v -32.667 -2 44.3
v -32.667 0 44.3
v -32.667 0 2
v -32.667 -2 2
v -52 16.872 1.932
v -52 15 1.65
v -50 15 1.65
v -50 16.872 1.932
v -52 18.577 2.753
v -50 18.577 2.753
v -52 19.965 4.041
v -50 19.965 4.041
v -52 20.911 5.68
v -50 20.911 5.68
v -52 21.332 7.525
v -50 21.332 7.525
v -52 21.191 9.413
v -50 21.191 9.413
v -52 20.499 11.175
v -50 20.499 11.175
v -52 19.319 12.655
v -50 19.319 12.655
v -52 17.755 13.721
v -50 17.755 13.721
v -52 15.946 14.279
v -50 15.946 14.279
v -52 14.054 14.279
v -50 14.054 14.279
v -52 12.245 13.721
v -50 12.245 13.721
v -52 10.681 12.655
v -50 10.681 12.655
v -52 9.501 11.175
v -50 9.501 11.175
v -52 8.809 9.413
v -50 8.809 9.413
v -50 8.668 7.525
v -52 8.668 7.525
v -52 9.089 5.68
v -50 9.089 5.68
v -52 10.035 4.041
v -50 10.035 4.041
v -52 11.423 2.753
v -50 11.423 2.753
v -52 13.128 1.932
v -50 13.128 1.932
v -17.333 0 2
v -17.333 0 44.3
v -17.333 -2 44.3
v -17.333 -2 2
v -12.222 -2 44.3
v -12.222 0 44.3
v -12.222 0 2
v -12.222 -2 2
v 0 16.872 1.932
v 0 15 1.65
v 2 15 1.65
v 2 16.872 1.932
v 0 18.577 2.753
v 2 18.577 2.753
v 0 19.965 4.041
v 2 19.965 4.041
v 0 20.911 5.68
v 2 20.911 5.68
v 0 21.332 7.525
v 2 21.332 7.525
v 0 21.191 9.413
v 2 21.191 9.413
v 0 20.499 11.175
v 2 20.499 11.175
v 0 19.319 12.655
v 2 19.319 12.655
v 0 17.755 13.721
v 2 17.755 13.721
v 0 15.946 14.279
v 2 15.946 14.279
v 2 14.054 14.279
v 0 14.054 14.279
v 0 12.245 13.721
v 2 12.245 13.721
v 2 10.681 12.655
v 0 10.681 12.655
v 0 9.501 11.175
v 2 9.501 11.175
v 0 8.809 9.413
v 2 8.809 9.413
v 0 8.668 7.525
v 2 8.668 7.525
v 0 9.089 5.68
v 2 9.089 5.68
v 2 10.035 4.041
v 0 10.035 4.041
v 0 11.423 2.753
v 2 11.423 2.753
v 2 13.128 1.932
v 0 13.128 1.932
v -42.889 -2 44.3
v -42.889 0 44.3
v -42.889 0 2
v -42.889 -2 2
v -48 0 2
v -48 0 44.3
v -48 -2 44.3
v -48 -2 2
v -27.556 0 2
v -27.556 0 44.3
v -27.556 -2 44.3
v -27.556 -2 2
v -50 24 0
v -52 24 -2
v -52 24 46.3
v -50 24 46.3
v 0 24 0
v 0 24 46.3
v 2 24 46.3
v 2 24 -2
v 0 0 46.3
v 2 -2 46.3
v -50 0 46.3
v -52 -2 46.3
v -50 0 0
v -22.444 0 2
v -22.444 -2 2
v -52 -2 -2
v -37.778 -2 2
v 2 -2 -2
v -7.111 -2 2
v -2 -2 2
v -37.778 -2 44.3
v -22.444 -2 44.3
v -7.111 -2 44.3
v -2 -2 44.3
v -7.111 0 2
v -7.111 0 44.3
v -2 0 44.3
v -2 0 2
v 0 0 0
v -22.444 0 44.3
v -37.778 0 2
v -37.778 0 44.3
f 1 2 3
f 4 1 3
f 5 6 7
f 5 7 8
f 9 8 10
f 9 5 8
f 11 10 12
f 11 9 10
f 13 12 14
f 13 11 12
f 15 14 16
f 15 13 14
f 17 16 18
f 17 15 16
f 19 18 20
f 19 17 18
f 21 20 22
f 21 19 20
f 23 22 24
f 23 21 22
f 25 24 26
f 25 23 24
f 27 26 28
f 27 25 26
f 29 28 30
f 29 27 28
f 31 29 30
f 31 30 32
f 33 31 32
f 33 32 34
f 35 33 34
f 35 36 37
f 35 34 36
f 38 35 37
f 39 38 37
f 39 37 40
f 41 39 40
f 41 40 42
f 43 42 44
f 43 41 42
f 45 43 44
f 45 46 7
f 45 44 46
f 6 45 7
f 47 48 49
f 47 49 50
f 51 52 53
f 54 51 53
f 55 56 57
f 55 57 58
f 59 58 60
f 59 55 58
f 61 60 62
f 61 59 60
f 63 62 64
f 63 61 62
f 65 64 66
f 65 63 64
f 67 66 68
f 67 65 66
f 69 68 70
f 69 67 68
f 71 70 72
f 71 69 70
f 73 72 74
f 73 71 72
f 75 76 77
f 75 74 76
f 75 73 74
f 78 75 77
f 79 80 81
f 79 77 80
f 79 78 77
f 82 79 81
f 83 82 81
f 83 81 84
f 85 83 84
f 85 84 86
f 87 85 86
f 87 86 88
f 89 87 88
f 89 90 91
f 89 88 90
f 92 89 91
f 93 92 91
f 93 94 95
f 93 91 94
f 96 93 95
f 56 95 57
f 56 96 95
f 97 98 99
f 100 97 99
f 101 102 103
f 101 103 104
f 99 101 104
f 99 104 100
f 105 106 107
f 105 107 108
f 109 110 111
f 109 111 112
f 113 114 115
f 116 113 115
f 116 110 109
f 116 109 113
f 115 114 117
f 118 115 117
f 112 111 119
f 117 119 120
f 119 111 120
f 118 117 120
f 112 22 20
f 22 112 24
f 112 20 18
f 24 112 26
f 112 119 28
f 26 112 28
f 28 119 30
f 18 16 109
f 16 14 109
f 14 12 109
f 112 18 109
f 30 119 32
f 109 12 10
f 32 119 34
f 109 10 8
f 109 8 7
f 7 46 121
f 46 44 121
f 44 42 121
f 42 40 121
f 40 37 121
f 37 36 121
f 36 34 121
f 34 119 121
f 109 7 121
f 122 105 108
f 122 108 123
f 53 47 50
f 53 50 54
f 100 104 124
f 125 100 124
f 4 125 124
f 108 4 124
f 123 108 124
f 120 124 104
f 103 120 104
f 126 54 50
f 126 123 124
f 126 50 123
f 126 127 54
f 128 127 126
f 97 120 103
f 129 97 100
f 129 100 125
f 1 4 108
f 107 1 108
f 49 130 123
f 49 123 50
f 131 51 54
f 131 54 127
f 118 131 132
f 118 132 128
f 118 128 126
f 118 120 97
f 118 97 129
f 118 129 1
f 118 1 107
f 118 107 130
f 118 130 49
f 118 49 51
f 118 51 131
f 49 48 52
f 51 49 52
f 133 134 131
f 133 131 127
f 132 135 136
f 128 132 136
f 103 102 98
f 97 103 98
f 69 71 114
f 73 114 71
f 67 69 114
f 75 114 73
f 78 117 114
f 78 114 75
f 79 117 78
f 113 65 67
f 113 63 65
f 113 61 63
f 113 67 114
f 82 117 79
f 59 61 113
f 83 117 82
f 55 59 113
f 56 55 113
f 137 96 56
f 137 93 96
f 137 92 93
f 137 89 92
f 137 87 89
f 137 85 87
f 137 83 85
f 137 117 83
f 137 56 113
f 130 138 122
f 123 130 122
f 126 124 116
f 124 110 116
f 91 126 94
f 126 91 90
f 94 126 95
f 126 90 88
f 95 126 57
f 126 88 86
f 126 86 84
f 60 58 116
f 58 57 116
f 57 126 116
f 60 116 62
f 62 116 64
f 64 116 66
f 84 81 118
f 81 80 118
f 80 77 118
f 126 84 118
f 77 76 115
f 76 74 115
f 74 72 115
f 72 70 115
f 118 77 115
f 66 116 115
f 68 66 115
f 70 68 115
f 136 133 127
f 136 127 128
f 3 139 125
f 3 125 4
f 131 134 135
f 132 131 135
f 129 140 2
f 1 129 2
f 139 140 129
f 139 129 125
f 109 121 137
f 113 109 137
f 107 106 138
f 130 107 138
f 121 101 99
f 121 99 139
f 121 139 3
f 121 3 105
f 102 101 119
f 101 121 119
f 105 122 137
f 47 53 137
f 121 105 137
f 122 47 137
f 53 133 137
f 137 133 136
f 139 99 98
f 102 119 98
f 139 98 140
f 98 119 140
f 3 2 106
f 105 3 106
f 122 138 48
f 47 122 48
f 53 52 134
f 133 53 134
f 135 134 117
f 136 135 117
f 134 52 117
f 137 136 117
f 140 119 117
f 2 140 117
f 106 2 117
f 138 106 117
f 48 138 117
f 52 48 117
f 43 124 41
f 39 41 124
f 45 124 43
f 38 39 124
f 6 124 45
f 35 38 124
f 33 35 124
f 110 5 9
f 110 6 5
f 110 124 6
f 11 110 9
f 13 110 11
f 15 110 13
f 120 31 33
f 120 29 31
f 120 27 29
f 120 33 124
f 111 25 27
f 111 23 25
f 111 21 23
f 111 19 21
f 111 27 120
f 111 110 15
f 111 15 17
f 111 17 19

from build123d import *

# Parameters (mm, degrees)
CROQUIS1_W                 = 54
CROQUIS1_H                 = 50.3
CROQUIS1_W_2               = 50
CROQUIS1_H_2               = 46.3
SALIENTE_EXTRUIR1_DEPTH    = 24
CROQUIS2_W                 = 54
CROQUIS2_H                 = 50.3
SALIENTE_EXTRUIR2_DEPTH    = 2
CORTAR_EXTRUIR4_DEPTH      = 54
CORTAR_EXTRUIR5_REACH      = 75.646
CROQUIS7_W                 = 5.111111111
CROQUIS7_H                 = 42.3
CROQUIS7_W_2               = 5.111111112
CORTAR_EXTRUIR6_DEPTH      = 59.725548103
CORTAR_EXTRUIR6_DEPTH_BACK = 59.725548103
CROQUIS8_R                 = 6.35


with BuildPart() as part:
    # Croquis1 → Saliente-Extruir1 (new body)
    with BuildSketch(Plane(origin=(0, 0, 0), x_dir=(1, 0, 0), z_dir=(0, 1, 0))):
        with Locations((-25, -23.15)):
            Rectangle(CROQUIS1_W, CROQUIS1_H)
        with Locations((-25, -23.15)):
            Rectangle(CROQUIS1_W_2, CROQUIS1_H_2, mode=Mode.SUBTRACT)
    extrude(amount=SALIENTE_EXTRUIR1_DEPTH)

    # Croquis2 → Saliente-Extruir2 (add)
    with BuildSketch(Plane.XZ):
        with Locations((-25, 23.15)):
            Rectangle(CROQUIS2_W, CROQUIS2_H)
    extrude(amount=SALIENTE_EXTRUIR2_DEPTH)

    # Croquis6 → Cortar-Extruir4 (cut)
    with BuildSketch(Plane.ZY.offset(52)):
        Polygon((46.3, 24), (46.3, 0), (46.3, -2), (48.3, -2), (48.3, 24), align=None)
    extrude(amount=-CORTAR_EXTRUIR4_DEPTH, mode=Mode.SUBTRACT)

    # Croquis7 → Cortar-Extruir5 (cut, up to next)
    with BuildSketch(Plane(origin=(0, 0, 0), x_dir=(1, 0, 0), z_dir=(0, 1, 0)), mode=Mode.PRIVATE) as cortar_extruir5_sk1:
        with Locations((-45.444444445, -23.15)):
            Rectangle(CROQUIS7_W, CROQUIS7_H)
    cortar_extruir5_tool1 = extrude(cortar_extruir5_sk1.sketch, amount=-CORTAR_EXTRUIR5_REACH, mode=Mode.PRIVATE) & part.part
    # Croquis7 → Cortar-Extruir5 (cut, up to next)
    with BuildSketch(Plane(origin=(0, 0, 0), x_dir=(1, 0, 0), z_dir=(0, 1, 0)), mode=Mode.PRIVATE) as cortar_extruir5_sk2:
        with Locations((-35.222222223, -23.15)):
            Rectangle(CROQUIS7_W, CROQUIS7_H)
    cortar_extruir5_tool2 = extrude(cortar_extruir5_sk2.sketch, amount=-CORTAR_EXTRUIR5_REACH, mode=Mode.PRIVATE) & part.part
    # Croquis7 → Cortar-Extruir5 (cut, up to next)
    with BuildSketch(Plane(origin=(0, 0, 0), x_dir=(1, 0, 0), z_dir=(0, 1, 0)), mode=Mode.PRIVATE) as cortar_extruir5_sk3:
        with Locations((-14.777777778, -23.15)):
            Rectangle(CROQUIS7_W, CROQUIS7_H)
    cortar_extruir5_tool3 = extrude(cortar_extruir5_sk3.sketch, amount=-CORTAR_EXTRUIR5_REACH, mode=Mode.PRIVATE) & part.part
    # Croquis7 → Cortar-Extruir5 (cut, up to next)
    with BuildSketch(Plane(origin=(0, 0, 0), x_dir=(1, 0, 0), z_dir=(0, 1, 0)), mode=Mode.PRIVATE) as cortar_extruir5_sk4:
        with Locations((-4.555555555, -23.15)):
            Rectangle(CROQUIS7_W, CROQUIS7_H)
    cortar_extruir5_tool4 = extrude(cortar_extruir5_sk4.sketch, amount=-CORTAR_EXTRUIR5_REACH, mode=Mode.PRIVATE) & part.part
    # Croquis7 → Cortar-Extruir5 (cut, up to next)
    with BuildSketch(Plane(origin=(0, 0, 0), x_dir=(1, 0, 0), z_dir=(0, 1, 0)), mode=Mode.PRIVATE) as cortar_extruir5_sk5:
        with Locations((-25, -23.15)):
            Rectangle(CROQUIS7_W_2, CROQUIS7_H)
    cortar_extruir5_tool5 = extrude(cortar_extruir5_sk5.sketch, amount=-CORTAR_EXTRUIR5_REACH, mode=Mode.PRIVATE) & part.part
    add(cortar_extruir5_tool1.solids().sort_by_distance((-45.444444, 0, 23.15))[0], mode=Mode.SUBTRACT)
    add(cortar_extruir5_tool2.solids().sort_by_distance((-35.222222, 0, 23.15))[0], mode=Mode.SUBTRACT)
    add(cortar_extruir5_tool3.solids().sort_by_distance((-14.777778, 0, 23.15))[0], mode=Mode.SUBTRACT)
    add(cortar_extruir5_tool4.solids().sort_by_distance((-4.555556, 0, 23.15))[0], mode=Mode.SUBTRACT)
    add(cortar_extruir5_tool5.solids().sort_by_distance((-25, 0, 23.15))[0], mode=Mode.SUBTRACT)

    # Croquis8 → Cortar-Extruir6 (cut, two sides: drawn at the far end of the back side and taken through both)
    with BuildSketch(Plane(origin=(-25, 0, 0), x_dir=(0, 0, -1), z_dir=(1, 0, 0)).offset(-CORTAR_EXTRUIR6_DEPTH_BACK)):
        with Locations((-8, 15)):
            Circle(CROQUIS8_R)
    extrude(amount=CORTAR_EXTRUIR6_DEPTH + CORTAR_EXTRUIR6_DEPTH_BACK, mode=Mode.SUBTRACT)


solid = part.part
